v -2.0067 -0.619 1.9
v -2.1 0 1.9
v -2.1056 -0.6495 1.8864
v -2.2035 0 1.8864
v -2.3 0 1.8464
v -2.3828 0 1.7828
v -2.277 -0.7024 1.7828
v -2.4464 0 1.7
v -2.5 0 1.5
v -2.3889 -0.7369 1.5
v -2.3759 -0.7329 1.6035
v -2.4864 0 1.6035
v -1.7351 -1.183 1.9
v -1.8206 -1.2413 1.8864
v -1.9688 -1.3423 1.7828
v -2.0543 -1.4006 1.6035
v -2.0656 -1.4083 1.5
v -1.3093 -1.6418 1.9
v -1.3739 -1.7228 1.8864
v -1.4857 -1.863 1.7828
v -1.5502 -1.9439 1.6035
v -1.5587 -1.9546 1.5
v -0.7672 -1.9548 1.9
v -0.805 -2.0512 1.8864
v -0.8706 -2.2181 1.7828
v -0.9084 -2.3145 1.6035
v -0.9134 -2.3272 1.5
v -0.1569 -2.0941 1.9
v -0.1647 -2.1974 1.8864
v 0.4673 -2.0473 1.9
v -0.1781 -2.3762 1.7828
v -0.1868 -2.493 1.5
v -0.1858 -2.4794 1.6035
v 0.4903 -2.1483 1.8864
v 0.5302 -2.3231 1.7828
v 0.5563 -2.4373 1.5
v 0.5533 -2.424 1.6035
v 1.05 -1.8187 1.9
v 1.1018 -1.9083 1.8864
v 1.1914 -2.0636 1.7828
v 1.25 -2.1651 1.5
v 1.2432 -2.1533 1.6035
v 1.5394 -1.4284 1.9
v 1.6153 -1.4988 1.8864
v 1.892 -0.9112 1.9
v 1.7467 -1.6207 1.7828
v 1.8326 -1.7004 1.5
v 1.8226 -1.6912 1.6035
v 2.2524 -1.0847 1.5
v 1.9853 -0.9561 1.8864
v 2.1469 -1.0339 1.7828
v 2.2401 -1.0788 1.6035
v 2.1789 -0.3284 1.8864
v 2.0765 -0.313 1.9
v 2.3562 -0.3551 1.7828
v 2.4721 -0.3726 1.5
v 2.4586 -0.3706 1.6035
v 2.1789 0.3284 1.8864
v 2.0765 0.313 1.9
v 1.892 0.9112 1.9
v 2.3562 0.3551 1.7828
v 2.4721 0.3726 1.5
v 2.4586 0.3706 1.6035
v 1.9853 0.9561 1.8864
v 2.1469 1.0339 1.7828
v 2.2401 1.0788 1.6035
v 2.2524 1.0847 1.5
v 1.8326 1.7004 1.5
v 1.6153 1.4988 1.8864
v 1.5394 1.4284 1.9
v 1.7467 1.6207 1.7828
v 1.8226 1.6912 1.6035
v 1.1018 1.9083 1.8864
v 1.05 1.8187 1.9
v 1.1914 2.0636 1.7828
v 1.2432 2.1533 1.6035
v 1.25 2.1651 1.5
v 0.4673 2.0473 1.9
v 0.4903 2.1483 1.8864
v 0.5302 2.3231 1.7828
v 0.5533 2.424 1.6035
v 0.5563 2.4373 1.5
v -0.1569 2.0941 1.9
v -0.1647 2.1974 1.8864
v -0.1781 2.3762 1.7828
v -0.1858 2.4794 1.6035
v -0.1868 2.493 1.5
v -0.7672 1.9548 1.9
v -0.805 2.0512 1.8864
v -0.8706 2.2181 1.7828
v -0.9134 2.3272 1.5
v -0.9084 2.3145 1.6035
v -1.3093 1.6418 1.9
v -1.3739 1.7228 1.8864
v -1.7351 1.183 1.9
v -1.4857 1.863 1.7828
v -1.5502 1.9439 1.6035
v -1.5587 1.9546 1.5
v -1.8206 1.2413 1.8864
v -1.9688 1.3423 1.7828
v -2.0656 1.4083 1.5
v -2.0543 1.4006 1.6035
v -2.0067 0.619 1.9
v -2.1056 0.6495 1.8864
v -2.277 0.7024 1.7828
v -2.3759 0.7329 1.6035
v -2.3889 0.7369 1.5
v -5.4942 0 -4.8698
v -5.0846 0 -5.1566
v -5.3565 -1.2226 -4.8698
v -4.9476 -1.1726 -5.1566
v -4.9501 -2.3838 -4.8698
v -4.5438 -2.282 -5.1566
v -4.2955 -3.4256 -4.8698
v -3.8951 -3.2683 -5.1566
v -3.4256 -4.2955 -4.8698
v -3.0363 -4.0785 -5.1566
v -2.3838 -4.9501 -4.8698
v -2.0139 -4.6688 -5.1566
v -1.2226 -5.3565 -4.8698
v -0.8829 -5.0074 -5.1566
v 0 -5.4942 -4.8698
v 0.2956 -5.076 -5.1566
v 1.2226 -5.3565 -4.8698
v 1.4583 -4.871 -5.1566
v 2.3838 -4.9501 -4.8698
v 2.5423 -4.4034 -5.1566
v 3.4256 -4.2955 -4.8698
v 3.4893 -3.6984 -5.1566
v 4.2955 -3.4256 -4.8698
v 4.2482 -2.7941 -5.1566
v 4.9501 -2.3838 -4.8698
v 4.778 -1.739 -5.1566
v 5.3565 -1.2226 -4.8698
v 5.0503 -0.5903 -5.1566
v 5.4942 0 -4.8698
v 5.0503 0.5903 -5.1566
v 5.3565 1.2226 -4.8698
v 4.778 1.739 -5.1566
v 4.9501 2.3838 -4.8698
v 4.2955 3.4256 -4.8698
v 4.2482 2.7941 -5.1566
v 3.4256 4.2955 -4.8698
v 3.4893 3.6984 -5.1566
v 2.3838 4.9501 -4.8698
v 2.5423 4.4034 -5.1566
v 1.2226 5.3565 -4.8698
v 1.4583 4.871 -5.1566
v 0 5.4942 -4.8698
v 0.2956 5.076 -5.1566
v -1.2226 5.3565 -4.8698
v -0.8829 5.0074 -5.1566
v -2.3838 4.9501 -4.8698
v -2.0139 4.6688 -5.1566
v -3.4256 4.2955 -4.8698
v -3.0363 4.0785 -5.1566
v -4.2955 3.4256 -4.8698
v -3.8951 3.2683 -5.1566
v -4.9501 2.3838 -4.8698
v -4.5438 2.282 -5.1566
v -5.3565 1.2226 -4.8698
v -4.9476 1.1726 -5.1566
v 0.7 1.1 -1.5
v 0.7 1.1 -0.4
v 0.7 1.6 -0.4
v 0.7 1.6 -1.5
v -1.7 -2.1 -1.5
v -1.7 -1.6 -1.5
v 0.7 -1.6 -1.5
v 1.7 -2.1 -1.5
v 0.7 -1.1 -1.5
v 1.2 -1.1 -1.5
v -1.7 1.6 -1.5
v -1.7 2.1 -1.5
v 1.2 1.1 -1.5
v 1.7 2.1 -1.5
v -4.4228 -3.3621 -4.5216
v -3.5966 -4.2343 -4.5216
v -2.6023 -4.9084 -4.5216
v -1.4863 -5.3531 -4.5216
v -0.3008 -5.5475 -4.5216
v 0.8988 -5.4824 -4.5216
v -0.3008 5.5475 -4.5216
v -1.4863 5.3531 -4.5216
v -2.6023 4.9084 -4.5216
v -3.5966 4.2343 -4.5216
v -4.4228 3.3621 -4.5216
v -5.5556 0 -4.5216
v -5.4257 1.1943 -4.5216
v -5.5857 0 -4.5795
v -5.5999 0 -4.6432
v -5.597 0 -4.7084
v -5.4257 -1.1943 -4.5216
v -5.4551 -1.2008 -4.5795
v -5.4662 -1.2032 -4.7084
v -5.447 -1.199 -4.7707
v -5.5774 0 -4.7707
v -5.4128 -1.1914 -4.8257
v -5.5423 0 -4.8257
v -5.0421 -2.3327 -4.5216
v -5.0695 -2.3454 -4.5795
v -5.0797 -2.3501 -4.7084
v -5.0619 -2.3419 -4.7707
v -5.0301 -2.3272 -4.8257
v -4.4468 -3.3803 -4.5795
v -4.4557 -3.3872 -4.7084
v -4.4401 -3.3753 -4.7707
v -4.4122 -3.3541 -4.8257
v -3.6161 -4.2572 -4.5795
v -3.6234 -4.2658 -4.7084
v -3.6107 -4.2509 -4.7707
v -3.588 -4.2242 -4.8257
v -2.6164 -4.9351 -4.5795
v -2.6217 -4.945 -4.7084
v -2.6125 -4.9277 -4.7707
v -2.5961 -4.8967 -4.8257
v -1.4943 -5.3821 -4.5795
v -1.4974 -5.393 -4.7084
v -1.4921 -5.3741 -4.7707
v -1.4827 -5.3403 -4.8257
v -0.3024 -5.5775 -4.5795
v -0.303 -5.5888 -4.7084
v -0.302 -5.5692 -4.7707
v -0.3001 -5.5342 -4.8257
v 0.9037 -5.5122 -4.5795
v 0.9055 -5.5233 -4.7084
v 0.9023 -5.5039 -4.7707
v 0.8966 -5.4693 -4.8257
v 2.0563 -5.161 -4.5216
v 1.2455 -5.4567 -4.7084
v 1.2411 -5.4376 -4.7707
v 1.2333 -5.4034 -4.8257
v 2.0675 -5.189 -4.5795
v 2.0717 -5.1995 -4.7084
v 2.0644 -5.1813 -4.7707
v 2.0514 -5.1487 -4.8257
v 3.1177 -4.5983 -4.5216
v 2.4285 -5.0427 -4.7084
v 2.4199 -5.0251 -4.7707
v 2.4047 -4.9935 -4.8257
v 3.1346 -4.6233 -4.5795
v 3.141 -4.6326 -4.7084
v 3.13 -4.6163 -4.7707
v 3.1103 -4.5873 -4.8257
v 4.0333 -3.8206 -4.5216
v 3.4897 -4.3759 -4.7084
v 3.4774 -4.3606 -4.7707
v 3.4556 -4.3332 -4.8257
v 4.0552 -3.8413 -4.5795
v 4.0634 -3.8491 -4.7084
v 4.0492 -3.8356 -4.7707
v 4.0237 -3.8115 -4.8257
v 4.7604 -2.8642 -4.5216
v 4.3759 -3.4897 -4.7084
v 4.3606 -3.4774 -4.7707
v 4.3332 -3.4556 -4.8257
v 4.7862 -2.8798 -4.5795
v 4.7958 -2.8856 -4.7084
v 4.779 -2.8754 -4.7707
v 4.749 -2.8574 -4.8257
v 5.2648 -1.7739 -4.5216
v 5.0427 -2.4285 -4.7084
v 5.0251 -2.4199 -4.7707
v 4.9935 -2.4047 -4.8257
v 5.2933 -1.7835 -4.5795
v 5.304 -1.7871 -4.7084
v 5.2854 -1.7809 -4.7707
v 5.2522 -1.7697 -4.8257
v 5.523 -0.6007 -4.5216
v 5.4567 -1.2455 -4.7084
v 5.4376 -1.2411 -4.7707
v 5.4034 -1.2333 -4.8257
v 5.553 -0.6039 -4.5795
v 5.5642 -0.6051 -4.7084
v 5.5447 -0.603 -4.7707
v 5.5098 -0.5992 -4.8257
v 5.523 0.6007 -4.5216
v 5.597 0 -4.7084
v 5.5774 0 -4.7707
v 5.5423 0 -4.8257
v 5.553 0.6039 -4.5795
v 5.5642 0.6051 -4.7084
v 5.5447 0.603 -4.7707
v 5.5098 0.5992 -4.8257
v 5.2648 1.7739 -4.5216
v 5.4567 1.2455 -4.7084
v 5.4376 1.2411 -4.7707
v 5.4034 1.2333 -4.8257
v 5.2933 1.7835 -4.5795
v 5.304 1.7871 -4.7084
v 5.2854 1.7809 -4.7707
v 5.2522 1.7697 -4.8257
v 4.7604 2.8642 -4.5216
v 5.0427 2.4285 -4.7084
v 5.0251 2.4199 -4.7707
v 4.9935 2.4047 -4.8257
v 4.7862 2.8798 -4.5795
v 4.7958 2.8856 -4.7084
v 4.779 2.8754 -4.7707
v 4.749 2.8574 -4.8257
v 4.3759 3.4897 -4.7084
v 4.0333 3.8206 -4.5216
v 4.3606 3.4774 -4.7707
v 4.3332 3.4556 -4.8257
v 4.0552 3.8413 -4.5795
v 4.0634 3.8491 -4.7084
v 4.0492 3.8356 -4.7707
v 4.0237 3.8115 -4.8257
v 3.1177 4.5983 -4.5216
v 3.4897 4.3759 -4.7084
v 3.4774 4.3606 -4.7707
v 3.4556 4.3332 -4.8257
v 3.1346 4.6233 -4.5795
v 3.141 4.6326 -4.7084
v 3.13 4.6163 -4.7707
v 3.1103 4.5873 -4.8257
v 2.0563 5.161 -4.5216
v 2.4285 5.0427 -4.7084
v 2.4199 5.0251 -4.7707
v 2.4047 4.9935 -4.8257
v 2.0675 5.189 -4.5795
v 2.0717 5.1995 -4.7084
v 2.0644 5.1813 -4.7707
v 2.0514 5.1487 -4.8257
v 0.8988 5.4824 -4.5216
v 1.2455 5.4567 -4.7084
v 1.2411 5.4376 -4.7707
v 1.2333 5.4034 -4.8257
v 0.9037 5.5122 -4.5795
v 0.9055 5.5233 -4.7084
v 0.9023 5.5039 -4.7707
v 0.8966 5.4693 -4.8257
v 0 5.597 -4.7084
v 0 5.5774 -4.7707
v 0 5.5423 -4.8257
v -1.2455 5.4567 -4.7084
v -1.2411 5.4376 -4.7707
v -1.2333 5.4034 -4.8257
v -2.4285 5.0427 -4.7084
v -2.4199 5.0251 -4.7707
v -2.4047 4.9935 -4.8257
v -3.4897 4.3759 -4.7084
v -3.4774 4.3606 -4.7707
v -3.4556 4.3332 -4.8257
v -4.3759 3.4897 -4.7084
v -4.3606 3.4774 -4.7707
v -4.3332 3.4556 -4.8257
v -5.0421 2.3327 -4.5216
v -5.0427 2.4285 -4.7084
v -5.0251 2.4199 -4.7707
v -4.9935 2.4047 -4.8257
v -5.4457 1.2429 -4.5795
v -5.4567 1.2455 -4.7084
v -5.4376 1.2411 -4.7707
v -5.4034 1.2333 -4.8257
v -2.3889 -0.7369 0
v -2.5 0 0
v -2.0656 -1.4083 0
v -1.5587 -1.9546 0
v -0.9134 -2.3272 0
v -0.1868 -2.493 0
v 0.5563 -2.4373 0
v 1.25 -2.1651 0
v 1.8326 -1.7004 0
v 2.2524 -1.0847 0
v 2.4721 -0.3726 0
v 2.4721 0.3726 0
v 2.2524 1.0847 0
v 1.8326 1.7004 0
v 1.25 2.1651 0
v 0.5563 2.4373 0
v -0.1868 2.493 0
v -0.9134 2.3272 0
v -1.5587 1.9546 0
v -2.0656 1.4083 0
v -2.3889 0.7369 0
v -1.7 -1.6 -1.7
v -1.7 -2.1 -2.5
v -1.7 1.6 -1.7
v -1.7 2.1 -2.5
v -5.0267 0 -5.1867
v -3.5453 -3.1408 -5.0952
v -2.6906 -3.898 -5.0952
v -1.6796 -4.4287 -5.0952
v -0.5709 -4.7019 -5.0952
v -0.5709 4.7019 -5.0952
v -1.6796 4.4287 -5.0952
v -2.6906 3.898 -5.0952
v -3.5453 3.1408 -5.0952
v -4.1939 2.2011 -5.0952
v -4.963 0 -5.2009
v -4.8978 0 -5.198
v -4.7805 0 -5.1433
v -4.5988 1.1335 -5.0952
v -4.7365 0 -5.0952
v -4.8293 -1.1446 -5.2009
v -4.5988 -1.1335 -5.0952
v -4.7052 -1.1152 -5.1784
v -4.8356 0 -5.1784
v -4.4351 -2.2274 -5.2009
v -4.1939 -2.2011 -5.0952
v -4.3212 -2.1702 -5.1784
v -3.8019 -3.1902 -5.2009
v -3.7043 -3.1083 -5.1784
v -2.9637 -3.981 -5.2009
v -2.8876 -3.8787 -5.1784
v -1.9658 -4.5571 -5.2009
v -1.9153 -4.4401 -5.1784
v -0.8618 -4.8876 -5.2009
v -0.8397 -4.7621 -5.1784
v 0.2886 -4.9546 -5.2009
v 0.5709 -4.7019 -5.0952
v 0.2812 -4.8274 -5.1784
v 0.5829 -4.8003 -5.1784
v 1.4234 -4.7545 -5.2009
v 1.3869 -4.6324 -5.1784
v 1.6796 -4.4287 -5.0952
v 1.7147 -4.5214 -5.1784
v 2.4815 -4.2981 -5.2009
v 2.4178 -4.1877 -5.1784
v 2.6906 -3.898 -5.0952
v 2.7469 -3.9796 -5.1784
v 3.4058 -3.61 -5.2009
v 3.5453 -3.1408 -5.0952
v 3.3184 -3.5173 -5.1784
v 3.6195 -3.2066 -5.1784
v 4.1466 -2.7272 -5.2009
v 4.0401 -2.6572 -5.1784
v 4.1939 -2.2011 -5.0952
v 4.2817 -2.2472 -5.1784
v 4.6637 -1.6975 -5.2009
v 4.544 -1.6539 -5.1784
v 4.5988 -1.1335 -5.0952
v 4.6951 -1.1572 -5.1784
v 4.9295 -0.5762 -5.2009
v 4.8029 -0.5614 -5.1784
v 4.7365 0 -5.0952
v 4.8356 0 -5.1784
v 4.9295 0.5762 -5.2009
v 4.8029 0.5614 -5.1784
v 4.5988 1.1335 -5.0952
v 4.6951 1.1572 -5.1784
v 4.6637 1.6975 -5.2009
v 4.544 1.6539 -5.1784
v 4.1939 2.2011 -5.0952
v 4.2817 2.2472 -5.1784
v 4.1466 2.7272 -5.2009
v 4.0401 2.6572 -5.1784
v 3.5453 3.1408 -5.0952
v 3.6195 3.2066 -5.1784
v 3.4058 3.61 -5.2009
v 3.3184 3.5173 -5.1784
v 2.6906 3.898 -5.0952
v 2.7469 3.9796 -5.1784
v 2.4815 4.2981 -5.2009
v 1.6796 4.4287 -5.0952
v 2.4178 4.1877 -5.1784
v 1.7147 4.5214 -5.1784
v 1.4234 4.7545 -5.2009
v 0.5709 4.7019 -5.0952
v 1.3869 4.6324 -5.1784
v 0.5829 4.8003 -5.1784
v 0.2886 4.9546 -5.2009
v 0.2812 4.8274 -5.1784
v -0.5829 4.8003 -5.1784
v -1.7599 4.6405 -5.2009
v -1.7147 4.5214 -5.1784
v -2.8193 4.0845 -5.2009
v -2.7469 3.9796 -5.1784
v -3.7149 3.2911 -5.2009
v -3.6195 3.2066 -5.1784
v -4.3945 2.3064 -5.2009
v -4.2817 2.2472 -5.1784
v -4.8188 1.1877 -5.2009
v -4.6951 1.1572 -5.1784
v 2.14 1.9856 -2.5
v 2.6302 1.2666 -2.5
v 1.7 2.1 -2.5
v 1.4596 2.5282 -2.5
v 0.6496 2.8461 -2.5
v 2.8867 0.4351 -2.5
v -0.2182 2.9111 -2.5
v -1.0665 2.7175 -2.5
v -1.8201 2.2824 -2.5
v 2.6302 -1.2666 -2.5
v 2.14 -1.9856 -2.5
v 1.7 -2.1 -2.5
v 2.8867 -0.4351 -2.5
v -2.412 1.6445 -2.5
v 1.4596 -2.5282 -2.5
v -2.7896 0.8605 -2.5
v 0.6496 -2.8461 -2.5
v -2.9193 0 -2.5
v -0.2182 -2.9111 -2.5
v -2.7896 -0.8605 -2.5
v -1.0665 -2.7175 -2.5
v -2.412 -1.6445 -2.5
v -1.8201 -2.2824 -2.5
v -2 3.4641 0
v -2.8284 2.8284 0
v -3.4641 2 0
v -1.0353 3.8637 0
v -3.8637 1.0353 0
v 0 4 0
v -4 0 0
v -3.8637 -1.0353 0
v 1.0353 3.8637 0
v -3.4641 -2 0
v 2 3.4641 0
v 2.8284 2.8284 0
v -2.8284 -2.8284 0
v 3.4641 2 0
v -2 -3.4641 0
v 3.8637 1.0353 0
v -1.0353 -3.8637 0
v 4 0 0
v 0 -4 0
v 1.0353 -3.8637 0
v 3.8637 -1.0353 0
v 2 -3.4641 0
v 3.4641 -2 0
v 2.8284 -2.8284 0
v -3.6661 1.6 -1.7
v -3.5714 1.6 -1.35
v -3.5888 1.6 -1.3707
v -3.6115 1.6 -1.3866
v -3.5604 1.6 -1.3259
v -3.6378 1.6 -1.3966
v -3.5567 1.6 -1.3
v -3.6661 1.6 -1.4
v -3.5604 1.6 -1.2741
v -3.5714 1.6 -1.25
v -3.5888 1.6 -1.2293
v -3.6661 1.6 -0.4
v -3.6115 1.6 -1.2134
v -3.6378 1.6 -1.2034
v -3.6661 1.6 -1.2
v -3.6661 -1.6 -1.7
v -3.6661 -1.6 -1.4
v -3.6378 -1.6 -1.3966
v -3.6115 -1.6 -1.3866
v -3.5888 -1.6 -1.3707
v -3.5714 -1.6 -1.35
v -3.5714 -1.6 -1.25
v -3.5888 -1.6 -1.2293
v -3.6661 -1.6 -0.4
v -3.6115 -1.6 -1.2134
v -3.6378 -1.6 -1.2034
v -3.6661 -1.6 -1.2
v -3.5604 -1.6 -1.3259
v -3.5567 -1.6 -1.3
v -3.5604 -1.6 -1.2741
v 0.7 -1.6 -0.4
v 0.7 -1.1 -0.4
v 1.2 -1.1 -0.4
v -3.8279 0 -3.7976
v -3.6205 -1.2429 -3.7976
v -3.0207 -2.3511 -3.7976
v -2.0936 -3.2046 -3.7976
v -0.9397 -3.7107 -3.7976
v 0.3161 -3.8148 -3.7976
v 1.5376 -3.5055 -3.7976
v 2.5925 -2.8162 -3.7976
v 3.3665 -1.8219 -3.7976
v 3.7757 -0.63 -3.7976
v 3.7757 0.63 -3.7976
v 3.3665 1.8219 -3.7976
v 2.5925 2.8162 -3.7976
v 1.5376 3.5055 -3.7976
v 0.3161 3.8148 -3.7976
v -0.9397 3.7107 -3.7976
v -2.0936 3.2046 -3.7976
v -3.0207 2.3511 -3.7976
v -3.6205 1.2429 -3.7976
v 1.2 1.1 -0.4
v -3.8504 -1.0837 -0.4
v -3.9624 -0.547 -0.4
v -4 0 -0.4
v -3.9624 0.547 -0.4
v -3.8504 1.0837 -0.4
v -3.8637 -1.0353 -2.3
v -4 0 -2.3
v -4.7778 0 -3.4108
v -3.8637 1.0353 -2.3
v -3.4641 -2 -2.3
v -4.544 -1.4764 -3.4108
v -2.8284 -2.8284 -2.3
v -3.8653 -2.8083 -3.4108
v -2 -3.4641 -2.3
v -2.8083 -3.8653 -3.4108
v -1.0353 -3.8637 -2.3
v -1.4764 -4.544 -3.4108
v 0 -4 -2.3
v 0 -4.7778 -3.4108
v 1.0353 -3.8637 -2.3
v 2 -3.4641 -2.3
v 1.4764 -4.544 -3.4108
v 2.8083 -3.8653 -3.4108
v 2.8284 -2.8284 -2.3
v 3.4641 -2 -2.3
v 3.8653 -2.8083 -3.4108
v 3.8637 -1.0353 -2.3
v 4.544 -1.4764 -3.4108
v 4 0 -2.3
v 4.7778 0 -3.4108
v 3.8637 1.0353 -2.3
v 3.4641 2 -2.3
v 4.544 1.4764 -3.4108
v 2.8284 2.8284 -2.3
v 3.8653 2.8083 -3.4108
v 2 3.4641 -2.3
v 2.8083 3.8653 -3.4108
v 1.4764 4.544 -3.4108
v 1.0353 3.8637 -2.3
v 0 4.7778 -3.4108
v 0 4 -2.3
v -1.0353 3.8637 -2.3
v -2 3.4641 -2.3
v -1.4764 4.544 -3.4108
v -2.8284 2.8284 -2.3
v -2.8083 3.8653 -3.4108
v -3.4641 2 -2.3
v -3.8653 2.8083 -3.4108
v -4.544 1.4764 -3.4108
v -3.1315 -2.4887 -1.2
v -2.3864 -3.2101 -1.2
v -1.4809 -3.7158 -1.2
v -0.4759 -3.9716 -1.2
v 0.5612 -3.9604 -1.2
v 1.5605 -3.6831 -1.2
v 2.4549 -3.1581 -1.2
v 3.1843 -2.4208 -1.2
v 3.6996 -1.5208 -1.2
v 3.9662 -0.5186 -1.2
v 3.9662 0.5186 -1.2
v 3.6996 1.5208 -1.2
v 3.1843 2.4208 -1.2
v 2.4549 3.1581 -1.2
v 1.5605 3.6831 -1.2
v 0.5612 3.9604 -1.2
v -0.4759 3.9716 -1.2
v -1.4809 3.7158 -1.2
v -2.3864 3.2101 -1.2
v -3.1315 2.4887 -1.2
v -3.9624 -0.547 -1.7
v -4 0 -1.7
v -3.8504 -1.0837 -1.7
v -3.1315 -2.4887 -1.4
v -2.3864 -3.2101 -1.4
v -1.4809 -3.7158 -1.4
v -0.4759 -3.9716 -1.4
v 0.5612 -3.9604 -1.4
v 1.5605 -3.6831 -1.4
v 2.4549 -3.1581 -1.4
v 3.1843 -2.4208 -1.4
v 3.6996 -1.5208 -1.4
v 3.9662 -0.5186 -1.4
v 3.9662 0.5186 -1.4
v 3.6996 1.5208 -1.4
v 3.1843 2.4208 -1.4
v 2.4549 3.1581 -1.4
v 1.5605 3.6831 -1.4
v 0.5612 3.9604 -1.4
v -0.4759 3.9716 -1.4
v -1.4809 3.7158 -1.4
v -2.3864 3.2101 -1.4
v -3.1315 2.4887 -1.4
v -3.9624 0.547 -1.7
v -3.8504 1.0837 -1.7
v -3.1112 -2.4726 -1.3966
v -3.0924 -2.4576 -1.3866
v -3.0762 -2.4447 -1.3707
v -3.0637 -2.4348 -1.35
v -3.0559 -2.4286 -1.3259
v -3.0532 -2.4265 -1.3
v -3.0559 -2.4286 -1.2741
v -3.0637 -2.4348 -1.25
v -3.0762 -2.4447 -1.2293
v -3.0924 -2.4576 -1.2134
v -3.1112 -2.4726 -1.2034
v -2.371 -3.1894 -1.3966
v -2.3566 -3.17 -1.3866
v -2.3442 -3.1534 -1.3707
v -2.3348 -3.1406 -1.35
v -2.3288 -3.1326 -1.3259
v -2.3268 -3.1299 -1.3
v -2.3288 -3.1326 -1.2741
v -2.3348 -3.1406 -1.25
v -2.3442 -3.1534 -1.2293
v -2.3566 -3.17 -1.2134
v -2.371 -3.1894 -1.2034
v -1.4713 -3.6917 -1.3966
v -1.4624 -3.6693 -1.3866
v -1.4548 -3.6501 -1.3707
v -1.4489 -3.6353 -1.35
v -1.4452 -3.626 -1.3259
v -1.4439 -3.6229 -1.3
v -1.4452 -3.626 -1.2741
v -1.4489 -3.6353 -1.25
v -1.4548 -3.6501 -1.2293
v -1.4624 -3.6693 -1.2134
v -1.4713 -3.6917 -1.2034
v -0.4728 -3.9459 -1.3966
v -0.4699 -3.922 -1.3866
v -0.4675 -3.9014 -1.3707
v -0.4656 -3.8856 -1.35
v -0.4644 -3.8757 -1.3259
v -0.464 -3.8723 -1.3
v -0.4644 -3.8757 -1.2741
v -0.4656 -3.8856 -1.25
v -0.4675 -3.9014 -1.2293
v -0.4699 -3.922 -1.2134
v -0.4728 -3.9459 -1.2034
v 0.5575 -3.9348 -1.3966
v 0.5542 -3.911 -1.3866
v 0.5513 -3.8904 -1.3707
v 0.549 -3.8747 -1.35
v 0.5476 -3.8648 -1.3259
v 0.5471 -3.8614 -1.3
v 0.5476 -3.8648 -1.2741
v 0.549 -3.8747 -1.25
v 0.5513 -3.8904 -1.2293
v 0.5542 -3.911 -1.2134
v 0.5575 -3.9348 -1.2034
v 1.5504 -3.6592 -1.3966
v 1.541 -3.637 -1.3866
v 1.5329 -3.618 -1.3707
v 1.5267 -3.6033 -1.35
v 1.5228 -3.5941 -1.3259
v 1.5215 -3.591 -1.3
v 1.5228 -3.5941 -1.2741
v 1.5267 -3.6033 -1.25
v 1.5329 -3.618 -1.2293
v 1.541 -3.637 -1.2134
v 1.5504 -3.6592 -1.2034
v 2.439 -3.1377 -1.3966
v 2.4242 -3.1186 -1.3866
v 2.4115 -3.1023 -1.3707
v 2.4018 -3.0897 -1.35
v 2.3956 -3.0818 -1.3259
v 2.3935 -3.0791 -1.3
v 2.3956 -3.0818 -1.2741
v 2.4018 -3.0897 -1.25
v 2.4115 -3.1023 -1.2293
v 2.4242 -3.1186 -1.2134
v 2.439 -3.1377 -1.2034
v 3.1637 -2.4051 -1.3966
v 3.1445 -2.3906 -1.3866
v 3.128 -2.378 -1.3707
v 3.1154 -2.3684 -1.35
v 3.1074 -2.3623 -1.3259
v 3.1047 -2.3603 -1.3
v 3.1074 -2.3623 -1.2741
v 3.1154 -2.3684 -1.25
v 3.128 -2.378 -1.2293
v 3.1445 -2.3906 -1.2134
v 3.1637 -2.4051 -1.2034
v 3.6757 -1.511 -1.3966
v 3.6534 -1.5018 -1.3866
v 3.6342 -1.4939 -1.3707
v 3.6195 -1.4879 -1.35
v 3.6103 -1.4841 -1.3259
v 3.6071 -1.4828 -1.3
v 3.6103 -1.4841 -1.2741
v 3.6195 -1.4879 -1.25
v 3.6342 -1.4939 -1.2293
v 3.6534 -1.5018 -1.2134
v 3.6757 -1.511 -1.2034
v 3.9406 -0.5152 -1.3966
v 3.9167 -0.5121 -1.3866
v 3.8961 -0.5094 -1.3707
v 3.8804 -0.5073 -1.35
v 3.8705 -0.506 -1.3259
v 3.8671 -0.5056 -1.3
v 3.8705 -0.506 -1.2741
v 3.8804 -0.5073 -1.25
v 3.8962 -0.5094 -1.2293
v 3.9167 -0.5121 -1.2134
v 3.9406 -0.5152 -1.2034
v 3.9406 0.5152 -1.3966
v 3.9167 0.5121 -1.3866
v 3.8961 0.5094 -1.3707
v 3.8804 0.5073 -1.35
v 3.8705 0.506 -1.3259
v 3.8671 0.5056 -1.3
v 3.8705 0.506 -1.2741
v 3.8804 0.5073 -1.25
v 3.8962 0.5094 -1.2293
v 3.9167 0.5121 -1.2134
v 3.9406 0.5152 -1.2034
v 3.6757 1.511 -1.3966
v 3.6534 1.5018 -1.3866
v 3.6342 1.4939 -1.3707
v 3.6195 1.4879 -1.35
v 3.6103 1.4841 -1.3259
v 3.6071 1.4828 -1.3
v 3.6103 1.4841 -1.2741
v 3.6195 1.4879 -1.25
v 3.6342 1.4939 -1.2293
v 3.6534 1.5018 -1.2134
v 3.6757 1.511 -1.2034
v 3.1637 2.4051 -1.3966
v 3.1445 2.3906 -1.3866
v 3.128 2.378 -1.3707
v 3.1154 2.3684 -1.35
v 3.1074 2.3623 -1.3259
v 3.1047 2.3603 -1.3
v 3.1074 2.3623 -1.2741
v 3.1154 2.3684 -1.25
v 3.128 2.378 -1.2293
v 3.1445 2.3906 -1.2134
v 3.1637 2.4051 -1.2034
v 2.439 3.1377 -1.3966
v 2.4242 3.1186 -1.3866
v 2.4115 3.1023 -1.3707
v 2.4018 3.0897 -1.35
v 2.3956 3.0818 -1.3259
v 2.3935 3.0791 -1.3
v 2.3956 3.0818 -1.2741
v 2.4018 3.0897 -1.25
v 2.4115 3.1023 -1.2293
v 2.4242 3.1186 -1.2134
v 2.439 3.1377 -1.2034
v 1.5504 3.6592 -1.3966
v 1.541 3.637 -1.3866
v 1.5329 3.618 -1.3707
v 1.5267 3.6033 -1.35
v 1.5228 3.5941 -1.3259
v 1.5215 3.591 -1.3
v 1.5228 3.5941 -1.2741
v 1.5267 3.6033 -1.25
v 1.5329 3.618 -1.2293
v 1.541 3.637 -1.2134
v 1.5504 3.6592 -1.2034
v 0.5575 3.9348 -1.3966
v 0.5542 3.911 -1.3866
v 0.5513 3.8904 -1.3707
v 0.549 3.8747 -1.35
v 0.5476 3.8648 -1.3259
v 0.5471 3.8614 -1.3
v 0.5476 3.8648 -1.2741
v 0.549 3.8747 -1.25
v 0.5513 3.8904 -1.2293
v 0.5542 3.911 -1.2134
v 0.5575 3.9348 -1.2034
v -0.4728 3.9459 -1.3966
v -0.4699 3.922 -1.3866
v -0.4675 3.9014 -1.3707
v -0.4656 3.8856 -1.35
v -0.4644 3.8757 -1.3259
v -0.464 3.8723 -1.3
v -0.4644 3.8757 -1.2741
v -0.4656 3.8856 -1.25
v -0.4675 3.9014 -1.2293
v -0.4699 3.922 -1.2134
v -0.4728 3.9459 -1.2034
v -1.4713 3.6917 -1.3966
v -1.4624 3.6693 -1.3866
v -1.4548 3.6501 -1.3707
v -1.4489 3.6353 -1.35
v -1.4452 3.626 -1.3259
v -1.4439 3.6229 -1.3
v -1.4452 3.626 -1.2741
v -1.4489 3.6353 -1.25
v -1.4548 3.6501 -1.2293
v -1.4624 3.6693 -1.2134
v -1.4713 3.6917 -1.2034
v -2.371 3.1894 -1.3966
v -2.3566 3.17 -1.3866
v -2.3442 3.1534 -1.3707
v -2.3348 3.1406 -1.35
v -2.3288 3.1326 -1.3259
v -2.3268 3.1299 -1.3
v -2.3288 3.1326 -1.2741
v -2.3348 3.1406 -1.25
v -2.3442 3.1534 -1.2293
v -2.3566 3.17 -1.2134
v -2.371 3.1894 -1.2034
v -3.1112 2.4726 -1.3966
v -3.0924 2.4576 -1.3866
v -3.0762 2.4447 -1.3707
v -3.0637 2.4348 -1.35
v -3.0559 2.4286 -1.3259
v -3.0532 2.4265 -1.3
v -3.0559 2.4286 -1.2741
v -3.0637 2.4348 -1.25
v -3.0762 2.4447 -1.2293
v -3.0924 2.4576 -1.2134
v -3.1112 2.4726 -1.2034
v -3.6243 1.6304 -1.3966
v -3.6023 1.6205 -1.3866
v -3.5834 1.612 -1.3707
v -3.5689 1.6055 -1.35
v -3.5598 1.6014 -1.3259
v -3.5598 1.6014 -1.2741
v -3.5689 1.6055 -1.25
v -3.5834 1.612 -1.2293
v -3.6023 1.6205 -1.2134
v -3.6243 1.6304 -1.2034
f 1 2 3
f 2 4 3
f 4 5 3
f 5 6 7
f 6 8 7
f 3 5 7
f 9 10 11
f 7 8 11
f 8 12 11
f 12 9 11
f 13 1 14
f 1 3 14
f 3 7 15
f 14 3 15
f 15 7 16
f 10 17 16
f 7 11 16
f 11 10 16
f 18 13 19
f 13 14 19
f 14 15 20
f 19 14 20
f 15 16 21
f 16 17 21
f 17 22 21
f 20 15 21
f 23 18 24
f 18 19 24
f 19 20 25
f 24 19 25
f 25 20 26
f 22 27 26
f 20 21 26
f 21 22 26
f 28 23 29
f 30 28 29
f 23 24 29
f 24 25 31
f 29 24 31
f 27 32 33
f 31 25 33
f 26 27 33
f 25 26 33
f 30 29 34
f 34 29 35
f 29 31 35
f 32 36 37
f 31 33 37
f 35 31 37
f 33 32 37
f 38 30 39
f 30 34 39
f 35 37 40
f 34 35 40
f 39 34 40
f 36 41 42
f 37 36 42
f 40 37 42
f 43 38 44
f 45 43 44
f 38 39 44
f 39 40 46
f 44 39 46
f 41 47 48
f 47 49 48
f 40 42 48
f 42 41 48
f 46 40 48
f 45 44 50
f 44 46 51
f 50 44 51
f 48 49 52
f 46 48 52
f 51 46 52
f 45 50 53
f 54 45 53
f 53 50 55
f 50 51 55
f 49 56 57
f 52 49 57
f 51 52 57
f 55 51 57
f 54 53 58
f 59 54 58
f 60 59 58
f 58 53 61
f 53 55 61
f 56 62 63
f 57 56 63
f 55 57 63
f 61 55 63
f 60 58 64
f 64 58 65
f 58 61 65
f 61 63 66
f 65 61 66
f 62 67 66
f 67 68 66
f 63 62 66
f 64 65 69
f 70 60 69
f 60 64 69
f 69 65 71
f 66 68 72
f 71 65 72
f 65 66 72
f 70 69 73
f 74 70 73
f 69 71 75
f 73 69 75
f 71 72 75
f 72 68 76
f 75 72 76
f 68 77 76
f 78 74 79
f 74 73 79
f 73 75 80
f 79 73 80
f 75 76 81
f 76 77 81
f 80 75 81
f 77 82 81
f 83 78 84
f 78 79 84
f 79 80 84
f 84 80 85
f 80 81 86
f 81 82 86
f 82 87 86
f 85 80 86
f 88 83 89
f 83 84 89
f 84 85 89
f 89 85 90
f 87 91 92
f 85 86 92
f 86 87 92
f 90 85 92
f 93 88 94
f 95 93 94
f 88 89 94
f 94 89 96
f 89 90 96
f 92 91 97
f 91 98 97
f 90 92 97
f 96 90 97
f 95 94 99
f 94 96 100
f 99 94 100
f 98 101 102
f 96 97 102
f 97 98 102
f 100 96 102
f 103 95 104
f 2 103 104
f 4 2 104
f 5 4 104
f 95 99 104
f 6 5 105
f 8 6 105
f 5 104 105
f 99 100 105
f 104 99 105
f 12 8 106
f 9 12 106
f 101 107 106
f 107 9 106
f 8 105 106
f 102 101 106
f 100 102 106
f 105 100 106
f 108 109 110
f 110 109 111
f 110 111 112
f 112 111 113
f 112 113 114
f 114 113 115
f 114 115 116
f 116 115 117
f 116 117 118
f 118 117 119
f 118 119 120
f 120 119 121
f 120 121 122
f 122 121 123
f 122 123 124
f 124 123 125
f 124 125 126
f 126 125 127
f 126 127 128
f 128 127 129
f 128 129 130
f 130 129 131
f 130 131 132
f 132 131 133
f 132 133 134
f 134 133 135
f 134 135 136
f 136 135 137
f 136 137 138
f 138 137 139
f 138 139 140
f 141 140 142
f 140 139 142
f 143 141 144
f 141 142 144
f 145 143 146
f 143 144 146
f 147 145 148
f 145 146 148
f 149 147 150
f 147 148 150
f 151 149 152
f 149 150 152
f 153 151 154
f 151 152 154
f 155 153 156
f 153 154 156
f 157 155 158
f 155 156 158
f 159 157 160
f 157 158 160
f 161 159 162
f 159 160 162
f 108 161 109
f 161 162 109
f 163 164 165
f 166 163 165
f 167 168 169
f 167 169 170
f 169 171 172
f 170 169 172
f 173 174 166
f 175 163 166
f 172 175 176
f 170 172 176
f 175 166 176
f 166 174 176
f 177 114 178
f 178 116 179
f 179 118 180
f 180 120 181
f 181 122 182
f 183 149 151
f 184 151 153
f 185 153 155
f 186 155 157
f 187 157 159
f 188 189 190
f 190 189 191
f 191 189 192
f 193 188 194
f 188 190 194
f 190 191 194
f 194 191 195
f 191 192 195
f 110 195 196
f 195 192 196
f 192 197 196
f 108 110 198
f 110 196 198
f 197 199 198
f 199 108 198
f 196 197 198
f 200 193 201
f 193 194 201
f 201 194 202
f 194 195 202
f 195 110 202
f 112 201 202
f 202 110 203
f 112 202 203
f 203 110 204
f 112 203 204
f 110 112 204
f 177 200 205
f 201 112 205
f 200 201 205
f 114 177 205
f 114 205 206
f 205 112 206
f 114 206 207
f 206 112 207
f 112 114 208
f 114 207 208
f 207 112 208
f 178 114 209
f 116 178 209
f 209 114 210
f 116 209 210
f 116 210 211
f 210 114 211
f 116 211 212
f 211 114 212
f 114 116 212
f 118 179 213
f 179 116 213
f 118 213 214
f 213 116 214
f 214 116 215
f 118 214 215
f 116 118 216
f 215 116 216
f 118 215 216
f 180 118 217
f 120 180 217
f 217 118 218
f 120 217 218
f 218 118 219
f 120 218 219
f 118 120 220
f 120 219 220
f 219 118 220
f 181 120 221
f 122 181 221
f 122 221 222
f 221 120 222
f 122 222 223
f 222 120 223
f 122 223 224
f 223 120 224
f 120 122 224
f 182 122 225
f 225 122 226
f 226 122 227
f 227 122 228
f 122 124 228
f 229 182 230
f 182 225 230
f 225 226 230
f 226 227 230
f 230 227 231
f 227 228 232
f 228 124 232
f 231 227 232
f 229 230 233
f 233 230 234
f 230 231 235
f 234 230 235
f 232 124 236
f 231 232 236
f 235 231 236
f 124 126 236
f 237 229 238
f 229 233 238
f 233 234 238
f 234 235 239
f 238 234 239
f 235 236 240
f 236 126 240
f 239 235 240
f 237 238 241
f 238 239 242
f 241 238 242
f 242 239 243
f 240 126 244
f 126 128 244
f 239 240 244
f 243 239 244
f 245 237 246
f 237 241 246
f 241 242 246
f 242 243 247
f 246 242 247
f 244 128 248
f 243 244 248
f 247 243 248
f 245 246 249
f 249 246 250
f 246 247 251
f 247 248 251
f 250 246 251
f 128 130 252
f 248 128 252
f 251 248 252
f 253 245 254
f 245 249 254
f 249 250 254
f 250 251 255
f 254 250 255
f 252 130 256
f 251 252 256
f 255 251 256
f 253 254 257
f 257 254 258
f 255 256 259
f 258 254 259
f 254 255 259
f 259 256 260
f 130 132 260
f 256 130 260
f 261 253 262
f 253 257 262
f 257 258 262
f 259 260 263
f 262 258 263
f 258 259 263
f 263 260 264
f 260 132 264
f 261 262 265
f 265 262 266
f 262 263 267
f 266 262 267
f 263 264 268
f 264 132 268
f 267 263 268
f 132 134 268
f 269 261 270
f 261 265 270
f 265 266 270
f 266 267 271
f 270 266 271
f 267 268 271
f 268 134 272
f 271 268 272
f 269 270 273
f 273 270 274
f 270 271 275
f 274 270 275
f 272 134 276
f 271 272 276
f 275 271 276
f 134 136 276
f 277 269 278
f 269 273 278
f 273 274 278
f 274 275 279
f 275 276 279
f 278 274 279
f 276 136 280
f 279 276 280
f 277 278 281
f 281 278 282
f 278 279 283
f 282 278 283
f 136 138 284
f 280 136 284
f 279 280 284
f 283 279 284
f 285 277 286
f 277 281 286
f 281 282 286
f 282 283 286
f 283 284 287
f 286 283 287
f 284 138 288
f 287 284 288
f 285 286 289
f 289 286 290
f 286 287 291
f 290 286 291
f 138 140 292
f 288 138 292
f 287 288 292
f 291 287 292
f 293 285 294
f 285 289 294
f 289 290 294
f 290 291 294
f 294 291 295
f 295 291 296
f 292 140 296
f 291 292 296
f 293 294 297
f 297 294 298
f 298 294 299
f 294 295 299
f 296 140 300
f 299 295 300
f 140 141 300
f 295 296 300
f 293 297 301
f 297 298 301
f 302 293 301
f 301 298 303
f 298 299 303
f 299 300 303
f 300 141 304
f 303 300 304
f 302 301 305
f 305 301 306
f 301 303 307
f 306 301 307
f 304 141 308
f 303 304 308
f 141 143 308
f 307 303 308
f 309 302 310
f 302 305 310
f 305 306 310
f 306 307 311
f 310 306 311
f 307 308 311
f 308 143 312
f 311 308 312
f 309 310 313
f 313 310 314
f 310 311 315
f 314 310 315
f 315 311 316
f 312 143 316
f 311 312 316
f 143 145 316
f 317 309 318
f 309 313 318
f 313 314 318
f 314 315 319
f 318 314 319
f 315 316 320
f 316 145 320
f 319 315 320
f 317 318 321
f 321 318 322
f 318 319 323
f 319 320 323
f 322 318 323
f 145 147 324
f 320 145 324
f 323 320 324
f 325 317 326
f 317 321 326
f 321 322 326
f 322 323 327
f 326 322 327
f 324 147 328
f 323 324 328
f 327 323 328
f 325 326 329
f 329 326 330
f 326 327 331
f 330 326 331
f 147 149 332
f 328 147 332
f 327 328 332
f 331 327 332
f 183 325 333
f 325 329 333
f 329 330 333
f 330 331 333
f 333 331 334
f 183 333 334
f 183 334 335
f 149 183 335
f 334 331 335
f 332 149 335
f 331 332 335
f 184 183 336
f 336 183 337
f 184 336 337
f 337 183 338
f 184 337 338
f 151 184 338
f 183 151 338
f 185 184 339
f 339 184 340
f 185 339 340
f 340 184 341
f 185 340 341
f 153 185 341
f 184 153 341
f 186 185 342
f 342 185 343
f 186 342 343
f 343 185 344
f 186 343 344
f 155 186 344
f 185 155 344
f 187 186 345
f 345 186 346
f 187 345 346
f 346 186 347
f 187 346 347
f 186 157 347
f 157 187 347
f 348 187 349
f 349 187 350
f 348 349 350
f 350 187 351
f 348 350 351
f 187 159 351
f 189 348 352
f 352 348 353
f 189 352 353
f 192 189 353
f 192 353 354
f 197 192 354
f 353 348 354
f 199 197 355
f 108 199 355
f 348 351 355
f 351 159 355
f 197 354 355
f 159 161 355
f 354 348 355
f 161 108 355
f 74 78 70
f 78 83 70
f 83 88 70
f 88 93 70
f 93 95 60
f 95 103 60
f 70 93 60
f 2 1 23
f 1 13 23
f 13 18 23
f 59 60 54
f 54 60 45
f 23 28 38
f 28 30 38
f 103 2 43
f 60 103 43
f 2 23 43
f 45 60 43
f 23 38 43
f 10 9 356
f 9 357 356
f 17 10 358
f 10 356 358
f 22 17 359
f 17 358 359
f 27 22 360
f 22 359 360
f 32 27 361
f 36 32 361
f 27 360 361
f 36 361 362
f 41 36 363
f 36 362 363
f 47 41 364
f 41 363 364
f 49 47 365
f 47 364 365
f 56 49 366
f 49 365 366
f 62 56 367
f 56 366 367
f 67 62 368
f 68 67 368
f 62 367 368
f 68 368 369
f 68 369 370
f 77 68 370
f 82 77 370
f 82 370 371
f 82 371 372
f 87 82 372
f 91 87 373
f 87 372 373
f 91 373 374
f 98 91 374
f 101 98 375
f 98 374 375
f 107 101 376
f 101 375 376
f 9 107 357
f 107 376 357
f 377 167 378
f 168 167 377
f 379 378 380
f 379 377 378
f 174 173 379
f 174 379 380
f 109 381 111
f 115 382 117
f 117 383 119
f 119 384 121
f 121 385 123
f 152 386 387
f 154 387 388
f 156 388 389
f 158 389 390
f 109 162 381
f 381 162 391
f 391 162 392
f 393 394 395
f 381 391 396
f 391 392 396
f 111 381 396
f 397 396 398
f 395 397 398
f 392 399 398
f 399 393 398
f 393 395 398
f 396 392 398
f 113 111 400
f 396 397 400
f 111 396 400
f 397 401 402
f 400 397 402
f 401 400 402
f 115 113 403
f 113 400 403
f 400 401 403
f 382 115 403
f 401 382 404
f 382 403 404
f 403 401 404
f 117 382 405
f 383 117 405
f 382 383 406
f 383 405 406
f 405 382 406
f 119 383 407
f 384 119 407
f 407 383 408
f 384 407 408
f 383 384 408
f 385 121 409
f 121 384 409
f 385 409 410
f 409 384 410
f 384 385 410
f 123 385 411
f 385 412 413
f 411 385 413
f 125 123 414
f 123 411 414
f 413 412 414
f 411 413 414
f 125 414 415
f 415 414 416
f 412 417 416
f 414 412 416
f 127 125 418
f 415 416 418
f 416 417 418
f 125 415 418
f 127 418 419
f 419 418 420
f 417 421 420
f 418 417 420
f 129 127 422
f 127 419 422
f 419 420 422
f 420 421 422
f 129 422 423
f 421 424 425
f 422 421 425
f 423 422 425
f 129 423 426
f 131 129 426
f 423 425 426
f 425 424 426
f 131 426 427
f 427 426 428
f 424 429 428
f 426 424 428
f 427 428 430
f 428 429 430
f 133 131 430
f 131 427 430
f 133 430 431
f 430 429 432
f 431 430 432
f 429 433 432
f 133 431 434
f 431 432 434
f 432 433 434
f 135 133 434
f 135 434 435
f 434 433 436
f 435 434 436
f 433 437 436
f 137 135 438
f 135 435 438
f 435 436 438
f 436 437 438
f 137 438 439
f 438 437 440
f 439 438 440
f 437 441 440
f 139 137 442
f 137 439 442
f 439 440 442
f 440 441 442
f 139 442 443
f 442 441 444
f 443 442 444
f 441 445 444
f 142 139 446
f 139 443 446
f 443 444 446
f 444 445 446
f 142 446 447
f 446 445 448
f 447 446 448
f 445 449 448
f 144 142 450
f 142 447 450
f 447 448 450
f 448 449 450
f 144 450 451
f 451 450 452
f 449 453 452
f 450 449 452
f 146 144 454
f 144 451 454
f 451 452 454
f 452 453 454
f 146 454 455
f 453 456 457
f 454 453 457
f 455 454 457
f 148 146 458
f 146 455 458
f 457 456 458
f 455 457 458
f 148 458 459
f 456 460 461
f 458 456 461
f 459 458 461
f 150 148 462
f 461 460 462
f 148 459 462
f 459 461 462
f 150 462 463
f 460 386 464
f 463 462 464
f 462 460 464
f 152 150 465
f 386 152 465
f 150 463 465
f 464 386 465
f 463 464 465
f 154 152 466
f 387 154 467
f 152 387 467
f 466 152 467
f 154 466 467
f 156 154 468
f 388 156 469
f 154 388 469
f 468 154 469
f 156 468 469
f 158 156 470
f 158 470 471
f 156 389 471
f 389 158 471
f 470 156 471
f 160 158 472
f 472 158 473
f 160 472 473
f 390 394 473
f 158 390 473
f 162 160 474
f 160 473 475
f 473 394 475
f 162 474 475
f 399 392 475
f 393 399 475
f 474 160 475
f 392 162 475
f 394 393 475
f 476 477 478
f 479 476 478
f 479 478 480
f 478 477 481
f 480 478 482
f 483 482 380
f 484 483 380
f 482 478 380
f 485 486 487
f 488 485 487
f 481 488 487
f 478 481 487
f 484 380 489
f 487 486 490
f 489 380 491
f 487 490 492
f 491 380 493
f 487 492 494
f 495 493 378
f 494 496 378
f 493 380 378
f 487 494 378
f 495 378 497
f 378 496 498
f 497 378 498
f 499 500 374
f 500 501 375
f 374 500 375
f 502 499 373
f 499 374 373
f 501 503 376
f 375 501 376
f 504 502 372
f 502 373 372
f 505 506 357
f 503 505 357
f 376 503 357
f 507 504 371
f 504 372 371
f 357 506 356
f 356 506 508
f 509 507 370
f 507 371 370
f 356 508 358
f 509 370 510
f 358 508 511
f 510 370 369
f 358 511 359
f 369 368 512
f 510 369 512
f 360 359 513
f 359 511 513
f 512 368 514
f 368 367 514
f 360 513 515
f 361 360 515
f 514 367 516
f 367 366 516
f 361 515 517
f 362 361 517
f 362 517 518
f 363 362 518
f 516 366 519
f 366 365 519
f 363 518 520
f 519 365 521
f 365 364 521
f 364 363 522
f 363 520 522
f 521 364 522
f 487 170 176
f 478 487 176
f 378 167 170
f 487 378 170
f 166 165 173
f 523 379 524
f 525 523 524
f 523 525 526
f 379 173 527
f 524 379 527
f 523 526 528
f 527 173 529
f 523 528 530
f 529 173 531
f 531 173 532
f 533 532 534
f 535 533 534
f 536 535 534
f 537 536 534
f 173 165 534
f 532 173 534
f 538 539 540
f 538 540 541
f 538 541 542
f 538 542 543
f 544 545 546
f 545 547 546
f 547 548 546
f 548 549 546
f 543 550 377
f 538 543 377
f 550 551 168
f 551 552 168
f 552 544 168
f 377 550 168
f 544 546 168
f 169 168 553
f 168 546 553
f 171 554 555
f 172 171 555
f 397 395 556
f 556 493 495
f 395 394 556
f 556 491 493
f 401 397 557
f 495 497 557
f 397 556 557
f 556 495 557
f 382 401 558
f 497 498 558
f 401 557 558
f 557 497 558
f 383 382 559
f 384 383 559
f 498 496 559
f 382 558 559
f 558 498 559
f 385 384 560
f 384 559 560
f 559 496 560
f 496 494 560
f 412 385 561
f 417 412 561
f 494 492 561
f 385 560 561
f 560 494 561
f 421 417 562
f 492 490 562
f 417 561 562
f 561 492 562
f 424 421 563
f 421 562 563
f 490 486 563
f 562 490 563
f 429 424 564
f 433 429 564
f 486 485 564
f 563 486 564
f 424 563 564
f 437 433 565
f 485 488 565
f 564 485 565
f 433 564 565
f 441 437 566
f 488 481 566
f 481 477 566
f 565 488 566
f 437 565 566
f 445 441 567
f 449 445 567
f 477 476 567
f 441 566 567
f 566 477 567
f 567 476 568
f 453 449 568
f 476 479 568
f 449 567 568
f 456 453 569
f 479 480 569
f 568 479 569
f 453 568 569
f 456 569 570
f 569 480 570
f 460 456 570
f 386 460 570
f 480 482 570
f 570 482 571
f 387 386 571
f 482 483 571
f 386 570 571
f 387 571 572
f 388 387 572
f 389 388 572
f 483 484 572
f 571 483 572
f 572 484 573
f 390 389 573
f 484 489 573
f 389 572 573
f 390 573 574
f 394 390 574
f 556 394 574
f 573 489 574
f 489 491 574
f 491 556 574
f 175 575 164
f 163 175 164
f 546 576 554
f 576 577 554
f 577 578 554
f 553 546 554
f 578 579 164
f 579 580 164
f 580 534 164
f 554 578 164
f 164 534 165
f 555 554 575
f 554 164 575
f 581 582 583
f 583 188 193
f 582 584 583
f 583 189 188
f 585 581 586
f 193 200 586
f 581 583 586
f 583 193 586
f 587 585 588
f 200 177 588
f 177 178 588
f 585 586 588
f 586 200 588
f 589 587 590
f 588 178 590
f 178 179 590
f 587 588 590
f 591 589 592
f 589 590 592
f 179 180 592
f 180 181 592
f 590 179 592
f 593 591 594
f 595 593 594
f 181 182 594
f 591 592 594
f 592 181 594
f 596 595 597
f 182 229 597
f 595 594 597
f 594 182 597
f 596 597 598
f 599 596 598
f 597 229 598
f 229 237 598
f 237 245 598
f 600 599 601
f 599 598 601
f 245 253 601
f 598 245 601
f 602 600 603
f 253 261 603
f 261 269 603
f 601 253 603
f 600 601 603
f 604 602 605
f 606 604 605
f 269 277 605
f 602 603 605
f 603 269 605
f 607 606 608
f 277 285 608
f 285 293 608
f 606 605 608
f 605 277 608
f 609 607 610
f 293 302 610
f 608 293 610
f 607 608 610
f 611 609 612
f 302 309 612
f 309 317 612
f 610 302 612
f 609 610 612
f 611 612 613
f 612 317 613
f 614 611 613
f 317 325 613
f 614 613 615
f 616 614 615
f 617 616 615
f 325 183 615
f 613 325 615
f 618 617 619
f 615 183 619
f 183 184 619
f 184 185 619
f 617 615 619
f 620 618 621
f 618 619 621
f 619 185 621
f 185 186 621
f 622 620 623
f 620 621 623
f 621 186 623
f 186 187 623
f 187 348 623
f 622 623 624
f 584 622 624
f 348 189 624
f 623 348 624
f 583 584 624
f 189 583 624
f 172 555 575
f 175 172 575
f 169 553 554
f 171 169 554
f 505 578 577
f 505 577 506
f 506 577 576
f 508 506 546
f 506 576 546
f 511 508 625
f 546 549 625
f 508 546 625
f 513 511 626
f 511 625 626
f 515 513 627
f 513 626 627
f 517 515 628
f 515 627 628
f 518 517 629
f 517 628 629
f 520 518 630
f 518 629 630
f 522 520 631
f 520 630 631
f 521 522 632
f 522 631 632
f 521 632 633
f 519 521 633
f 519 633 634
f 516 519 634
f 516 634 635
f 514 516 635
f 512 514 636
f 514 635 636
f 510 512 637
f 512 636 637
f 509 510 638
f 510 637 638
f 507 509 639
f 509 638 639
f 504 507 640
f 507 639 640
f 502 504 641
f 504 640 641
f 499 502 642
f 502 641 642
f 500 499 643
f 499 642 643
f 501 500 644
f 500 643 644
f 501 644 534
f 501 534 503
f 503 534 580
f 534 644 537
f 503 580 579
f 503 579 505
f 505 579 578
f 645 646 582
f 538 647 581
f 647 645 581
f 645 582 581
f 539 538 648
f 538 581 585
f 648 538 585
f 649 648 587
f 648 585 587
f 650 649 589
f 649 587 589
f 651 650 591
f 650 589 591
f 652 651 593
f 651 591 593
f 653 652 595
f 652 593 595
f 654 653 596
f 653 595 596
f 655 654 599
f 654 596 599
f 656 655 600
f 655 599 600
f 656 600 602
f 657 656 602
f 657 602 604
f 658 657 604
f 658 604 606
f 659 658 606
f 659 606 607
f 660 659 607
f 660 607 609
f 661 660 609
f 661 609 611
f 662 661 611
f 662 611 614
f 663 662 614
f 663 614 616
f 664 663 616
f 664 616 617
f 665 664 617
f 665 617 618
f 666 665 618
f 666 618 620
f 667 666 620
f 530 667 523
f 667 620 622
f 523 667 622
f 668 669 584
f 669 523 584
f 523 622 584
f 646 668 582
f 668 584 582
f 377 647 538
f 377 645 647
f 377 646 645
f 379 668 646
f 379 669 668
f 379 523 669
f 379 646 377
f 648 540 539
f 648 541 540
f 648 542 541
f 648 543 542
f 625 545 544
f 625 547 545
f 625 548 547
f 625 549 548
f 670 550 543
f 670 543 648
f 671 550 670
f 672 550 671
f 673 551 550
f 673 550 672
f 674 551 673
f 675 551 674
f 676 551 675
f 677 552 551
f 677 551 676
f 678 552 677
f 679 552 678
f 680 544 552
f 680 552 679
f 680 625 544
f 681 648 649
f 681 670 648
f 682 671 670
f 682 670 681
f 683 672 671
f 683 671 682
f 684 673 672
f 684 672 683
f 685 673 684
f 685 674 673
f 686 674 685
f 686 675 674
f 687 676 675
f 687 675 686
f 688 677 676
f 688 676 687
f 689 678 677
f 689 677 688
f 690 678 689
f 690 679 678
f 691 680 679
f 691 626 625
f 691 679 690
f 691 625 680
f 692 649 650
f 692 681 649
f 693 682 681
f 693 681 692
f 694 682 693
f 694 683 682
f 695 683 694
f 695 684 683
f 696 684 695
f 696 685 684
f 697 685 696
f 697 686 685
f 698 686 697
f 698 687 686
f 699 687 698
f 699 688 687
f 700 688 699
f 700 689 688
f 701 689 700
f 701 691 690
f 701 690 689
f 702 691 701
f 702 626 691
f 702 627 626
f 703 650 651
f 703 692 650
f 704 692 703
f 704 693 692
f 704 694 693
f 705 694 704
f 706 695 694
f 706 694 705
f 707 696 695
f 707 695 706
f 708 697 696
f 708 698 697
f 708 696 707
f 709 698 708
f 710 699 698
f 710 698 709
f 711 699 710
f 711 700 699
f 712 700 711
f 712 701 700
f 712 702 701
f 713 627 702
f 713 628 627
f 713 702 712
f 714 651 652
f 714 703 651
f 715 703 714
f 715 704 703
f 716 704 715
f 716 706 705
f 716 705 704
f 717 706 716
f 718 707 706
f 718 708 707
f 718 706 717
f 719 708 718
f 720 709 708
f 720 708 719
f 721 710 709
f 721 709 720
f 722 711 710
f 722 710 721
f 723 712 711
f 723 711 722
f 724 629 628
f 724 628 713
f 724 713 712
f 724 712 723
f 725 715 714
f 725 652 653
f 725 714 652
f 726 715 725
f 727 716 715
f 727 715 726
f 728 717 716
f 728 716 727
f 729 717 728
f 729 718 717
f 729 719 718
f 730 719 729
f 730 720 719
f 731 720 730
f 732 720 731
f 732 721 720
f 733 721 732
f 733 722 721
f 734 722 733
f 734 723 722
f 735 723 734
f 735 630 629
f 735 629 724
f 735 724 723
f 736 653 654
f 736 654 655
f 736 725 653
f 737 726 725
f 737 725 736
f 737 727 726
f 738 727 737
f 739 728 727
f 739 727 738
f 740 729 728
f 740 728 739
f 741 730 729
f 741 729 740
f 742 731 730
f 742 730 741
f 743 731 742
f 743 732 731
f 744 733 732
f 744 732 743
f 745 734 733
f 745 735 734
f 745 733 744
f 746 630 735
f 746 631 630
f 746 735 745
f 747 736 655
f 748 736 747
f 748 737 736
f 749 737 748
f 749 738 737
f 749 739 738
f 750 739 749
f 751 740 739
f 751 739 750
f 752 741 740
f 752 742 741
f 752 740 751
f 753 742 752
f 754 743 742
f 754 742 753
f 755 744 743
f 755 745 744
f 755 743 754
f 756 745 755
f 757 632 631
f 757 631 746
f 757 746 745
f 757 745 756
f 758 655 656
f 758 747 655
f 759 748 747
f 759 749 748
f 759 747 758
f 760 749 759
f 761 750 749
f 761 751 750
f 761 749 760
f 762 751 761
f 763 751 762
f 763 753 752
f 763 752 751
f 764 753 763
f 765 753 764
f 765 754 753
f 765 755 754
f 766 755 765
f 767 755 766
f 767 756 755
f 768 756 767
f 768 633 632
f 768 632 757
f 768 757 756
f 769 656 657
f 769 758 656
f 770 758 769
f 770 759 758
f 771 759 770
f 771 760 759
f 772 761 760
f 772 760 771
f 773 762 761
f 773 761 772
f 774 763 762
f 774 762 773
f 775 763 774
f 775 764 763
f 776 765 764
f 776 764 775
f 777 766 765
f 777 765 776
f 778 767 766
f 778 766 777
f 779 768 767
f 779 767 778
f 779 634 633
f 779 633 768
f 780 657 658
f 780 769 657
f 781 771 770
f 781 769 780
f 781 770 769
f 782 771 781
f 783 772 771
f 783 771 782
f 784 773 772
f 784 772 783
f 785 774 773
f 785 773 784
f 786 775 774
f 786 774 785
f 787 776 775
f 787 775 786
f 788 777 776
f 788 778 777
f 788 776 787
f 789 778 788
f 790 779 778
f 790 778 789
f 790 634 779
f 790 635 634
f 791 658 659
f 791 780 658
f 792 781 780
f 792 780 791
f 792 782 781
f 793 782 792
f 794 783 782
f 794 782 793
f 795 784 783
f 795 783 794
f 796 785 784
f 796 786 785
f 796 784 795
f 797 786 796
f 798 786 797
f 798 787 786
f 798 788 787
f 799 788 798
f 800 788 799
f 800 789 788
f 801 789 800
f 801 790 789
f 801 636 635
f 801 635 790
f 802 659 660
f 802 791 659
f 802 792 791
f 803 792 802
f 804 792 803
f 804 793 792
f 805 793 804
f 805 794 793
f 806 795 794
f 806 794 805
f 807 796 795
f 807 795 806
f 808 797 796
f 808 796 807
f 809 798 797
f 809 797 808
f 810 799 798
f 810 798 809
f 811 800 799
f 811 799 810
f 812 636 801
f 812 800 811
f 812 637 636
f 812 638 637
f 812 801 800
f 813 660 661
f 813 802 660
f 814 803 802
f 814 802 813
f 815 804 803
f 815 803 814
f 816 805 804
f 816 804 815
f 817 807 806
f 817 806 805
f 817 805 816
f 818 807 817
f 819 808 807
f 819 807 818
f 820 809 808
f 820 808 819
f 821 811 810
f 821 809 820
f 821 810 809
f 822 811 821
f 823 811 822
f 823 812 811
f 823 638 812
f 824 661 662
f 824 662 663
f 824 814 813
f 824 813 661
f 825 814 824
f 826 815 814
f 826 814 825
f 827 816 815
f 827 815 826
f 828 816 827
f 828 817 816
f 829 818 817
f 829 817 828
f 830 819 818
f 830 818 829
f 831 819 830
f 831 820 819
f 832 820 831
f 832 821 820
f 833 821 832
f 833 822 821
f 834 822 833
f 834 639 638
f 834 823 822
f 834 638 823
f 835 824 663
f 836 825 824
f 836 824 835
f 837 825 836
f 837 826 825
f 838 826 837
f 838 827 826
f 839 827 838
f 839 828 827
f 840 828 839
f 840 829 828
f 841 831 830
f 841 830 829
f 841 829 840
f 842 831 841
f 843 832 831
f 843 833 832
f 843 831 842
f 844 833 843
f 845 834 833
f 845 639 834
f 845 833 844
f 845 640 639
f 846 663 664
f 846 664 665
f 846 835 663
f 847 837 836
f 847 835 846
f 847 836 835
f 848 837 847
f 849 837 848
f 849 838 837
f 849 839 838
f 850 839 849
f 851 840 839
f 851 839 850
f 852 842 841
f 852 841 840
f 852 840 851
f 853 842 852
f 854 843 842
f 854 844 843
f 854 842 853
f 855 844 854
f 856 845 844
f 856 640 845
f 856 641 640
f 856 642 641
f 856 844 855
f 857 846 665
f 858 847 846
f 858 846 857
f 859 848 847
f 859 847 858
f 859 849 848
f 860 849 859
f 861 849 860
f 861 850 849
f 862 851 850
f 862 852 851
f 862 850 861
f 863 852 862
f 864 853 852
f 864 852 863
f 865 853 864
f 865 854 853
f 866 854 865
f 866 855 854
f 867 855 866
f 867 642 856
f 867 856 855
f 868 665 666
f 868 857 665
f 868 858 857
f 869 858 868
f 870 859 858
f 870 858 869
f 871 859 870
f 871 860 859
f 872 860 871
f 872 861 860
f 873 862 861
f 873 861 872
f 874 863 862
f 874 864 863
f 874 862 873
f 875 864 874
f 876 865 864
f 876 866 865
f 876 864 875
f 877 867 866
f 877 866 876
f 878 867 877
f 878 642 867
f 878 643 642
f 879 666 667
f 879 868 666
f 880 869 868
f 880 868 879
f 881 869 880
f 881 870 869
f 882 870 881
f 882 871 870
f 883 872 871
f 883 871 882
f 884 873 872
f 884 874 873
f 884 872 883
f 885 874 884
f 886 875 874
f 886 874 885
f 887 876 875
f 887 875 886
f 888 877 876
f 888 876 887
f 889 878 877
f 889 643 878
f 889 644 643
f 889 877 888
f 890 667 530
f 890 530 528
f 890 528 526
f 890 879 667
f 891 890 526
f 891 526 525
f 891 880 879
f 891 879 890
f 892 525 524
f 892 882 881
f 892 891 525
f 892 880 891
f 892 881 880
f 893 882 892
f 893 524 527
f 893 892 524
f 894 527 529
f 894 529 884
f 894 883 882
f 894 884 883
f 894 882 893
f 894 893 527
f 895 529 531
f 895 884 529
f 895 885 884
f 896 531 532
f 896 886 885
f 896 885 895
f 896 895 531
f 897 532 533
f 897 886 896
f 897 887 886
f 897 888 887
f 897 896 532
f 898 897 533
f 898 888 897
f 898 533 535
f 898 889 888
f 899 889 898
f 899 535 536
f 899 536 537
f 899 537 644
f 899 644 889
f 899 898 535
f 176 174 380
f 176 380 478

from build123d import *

# Parameters (mm, degrees)
SKETCH001_W     = 3.4
SKETCH001_H     = 4.2
POCKET_DEPTH    = 5
POCKET001_DEPTH = 1.3


with BuildPart() as part:
    # Sketch → Revolution (revolve)
    with BuildSketch(Plane.XZ):
        with BuildLine():
            Line((0, 1.9), (-2.1, 1.9))
            ThreePointArc((-2.1, 1.9), (-2.382843, 1.782843), (-2.5, 1.5))
            Line((-2.5, 1.5), (-2.5, 0))
            Line((-2.5, 0), (-4, 0))
            Line((-4, 0), (-4, -1.2))
            ThreePointArc((-4, -1.4), (-3.9, -1.3), (-4, -1.2))
            Line((-4, -1.4), (-4, -2.3))
            Line((-4, -2.3), (-5.555606, -4.521636))
            ThreePointArc((-5.555606, -4.521636), (-5.59702, -4.708442), (-5.494212, -4.869818))
            Line((-5.494212, -4.869818), (-5.084636, -5.156606))
            ThreePointArc((-5.084636, -5.156606), (-4.89783, -5.19802), (-4.736454, -5.095212))
            Line((-4.736454, -5.095212), (-2.919267, -2.5))
            Line((-2.919267, -2.5), (0, -2.5))
            Line((0, -2.5), (0, 1.9))
        make_face()
    revolve(axis=Axis((0, 0, 0), (0, 0, 1)))

    # Sketch001 → Pocket (cut)
    with BuildSketch(Plane.XY.offset(-1.5)):
        Rectangle(SKETCH001_W, SKETCH001_H)
    extrude(amount=-POCKET_DEPTH, mode=Mode.SUBTRACT)

    # Sketch002 → Pocket001 (cut)
    with BuildSketch(Plane.XY.offset(-0.4)):
        Polygon((-4.3, 1.6), (-4.3, -1.6), (0.7, -1.6), (0.7, -1.1), (1.2, -1.1), (1.2, 1.1), (0.7, 1.1), (0.7, 1.6), align=None)
    extrude(amount=-POCKET001_DEPTH, mode=Mode.SUBTRACT)


solid = part.part
